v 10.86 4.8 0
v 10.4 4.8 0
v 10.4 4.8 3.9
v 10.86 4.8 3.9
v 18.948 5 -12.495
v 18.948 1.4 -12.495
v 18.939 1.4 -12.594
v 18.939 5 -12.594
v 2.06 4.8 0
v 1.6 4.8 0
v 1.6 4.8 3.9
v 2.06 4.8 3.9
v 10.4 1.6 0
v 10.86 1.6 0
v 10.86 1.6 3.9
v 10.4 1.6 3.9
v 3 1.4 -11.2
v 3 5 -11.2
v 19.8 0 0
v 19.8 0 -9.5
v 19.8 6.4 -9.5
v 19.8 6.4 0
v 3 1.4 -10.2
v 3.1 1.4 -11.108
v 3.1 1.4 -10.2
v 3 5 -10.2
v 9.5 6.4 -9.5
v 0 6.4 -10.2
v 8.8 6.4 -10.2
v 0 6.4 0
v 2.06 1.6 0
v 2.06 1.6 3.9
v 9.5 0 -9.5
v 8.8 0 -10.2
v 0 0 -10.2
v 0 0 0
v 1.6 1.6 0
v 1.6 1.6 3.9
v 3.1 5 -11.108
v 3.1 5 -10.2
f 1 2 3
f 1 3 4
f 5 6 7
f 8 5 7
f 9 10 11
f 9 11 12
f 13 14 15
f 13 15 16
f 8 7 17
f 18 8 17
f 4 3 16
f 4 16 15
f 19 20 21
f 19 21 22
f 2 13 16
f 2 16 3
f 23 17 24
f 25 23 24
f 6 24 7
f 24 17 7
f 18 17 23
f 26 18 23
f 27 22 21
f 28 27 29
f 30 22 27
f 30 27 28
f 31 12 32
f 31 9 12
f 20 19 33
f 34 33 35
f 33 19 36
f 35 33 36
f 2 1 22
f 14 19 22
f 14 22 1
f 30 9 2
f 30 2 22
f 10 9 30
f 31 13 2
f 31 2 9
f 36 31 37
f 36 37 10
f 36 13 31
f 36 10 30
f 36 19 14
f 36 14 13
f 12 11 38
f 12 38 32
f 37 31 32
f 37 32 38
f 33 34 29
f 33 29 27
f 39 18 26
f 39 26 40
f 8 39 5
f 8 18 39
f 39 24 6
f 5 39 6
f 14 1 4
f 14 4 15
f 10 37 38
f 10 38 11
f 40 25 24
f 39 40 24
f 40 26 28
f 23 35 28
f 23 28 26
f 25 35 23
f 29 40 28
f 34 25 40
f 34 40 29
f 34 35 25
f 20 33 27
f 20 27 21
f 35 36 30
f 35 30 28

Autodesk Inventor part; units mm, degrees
ref_plane "YZ Plane" through (0, 0, 0) normal (1, 0, 0) x (0, 1, 0)
ref_plane "XZ Plane" through (0, 0, 0) normal (0, 1, 0) x (-1, 0, 0)
sketch "Sketch1" plane through (0, 0, 0) normal (0, 1, 0) x (-1, 0, 0)
  line L0 (0, 0) -> (0, -10.2)
  line L1 (0, -10.2) -> (-8.8, -10.2)
  line L2 (-8.8, -10.2) -> (-9.5, -9.5)
  line L3 (-9.5, -9.5) -> (-19.8, -9.5)
  line L4 (-19.8, -9.5) -> (-19.8, 0)
  line L5 (-19.8, 0) -> (0, 0)
  dimension "d0" = 10.2
  dimension "d1" = 9.5
  dimension "ss5glfLength" = 19.8
  dimension "d4" = 8.8
  dimension "d5" = 135
extrude "Extrusion1" add sketch "Sketch1" along normal blind 6.4
sketch "Sketch2" plane through (0, 0, 0) normal (0, 0, 1) x (1, 0, 0)
  line L0 (1.6, 4.8) -> (2.06, 4.8)
  line L1 (2.06, 4.8) -> (2.06, 1.6)
  line L2 (2.06, 1.6) -> (1.6, 1.6)
  line L3 (1.6, 1.6) -> (1.6, 4.8)
  line L4 (10.4, 4.8) -> (10.86, 4.8)
  line L5 (10.86, 4.8) -> (10.86, 1.6)
  line L6 (10.86, 1.6) -> (10.4, 1.6)
  line L7 (10.4, 1.6) -> (10.4, 4.8)
  line L8 (0, 0) -> (0, 6.4) projected
  line L9 (19.8, 0) -> (0, 0) projected
  dimension "d8" = 0.46
  dimension "pinWidth" = 3.2
  dimension "d10" = 1.6
  dimension "d11" = 8.8
  dimension "d12" = 1.6
extrude "Extrusion2" add sketch "Sketch2" along normal blind 3.9
ref_plane "Work Plane1" through (0, 3.2, 0) normal (0, 1, 0) x (1, 0, 0)
sketch "Sketch3" plane through (0, 3.2, 0) normal (0, 1, 0) x (1, 0, 0)
  line L0 (8.8, 10.2) -> (0, 10.2) projected
  line L1 (3.1, 10.2) -> (3.1, 11.1084)
  line L2 (3.1, 11.1084) -> (18.9478, 12.4949)
  line L3 (18.9478, 12.4949) -> (18.9391, 12.5945)
  line L4 (18.9391, 12.5945) -> (3, 11.2)
  line L5 (3, 11.2) -> (3, 10.2)
  line L6 (0, 10.2) -> (0, 0) projected
  dimension "d15" = 16
  dimension "d16" = 1
  dimension "d17" = 0.1
  dimension "d18" = 0.1
  dimension "d19" = 95
  dimension "d20" = 3
extrude "Extrusion3" add sketch "Sketch3" along normal mid plane 3.6
equation "\"d12\" = -0.5 * pinWidth + 0.5 * width"
equation "\"width\" = 6.4"
properties part number "SS-5GL-F"
